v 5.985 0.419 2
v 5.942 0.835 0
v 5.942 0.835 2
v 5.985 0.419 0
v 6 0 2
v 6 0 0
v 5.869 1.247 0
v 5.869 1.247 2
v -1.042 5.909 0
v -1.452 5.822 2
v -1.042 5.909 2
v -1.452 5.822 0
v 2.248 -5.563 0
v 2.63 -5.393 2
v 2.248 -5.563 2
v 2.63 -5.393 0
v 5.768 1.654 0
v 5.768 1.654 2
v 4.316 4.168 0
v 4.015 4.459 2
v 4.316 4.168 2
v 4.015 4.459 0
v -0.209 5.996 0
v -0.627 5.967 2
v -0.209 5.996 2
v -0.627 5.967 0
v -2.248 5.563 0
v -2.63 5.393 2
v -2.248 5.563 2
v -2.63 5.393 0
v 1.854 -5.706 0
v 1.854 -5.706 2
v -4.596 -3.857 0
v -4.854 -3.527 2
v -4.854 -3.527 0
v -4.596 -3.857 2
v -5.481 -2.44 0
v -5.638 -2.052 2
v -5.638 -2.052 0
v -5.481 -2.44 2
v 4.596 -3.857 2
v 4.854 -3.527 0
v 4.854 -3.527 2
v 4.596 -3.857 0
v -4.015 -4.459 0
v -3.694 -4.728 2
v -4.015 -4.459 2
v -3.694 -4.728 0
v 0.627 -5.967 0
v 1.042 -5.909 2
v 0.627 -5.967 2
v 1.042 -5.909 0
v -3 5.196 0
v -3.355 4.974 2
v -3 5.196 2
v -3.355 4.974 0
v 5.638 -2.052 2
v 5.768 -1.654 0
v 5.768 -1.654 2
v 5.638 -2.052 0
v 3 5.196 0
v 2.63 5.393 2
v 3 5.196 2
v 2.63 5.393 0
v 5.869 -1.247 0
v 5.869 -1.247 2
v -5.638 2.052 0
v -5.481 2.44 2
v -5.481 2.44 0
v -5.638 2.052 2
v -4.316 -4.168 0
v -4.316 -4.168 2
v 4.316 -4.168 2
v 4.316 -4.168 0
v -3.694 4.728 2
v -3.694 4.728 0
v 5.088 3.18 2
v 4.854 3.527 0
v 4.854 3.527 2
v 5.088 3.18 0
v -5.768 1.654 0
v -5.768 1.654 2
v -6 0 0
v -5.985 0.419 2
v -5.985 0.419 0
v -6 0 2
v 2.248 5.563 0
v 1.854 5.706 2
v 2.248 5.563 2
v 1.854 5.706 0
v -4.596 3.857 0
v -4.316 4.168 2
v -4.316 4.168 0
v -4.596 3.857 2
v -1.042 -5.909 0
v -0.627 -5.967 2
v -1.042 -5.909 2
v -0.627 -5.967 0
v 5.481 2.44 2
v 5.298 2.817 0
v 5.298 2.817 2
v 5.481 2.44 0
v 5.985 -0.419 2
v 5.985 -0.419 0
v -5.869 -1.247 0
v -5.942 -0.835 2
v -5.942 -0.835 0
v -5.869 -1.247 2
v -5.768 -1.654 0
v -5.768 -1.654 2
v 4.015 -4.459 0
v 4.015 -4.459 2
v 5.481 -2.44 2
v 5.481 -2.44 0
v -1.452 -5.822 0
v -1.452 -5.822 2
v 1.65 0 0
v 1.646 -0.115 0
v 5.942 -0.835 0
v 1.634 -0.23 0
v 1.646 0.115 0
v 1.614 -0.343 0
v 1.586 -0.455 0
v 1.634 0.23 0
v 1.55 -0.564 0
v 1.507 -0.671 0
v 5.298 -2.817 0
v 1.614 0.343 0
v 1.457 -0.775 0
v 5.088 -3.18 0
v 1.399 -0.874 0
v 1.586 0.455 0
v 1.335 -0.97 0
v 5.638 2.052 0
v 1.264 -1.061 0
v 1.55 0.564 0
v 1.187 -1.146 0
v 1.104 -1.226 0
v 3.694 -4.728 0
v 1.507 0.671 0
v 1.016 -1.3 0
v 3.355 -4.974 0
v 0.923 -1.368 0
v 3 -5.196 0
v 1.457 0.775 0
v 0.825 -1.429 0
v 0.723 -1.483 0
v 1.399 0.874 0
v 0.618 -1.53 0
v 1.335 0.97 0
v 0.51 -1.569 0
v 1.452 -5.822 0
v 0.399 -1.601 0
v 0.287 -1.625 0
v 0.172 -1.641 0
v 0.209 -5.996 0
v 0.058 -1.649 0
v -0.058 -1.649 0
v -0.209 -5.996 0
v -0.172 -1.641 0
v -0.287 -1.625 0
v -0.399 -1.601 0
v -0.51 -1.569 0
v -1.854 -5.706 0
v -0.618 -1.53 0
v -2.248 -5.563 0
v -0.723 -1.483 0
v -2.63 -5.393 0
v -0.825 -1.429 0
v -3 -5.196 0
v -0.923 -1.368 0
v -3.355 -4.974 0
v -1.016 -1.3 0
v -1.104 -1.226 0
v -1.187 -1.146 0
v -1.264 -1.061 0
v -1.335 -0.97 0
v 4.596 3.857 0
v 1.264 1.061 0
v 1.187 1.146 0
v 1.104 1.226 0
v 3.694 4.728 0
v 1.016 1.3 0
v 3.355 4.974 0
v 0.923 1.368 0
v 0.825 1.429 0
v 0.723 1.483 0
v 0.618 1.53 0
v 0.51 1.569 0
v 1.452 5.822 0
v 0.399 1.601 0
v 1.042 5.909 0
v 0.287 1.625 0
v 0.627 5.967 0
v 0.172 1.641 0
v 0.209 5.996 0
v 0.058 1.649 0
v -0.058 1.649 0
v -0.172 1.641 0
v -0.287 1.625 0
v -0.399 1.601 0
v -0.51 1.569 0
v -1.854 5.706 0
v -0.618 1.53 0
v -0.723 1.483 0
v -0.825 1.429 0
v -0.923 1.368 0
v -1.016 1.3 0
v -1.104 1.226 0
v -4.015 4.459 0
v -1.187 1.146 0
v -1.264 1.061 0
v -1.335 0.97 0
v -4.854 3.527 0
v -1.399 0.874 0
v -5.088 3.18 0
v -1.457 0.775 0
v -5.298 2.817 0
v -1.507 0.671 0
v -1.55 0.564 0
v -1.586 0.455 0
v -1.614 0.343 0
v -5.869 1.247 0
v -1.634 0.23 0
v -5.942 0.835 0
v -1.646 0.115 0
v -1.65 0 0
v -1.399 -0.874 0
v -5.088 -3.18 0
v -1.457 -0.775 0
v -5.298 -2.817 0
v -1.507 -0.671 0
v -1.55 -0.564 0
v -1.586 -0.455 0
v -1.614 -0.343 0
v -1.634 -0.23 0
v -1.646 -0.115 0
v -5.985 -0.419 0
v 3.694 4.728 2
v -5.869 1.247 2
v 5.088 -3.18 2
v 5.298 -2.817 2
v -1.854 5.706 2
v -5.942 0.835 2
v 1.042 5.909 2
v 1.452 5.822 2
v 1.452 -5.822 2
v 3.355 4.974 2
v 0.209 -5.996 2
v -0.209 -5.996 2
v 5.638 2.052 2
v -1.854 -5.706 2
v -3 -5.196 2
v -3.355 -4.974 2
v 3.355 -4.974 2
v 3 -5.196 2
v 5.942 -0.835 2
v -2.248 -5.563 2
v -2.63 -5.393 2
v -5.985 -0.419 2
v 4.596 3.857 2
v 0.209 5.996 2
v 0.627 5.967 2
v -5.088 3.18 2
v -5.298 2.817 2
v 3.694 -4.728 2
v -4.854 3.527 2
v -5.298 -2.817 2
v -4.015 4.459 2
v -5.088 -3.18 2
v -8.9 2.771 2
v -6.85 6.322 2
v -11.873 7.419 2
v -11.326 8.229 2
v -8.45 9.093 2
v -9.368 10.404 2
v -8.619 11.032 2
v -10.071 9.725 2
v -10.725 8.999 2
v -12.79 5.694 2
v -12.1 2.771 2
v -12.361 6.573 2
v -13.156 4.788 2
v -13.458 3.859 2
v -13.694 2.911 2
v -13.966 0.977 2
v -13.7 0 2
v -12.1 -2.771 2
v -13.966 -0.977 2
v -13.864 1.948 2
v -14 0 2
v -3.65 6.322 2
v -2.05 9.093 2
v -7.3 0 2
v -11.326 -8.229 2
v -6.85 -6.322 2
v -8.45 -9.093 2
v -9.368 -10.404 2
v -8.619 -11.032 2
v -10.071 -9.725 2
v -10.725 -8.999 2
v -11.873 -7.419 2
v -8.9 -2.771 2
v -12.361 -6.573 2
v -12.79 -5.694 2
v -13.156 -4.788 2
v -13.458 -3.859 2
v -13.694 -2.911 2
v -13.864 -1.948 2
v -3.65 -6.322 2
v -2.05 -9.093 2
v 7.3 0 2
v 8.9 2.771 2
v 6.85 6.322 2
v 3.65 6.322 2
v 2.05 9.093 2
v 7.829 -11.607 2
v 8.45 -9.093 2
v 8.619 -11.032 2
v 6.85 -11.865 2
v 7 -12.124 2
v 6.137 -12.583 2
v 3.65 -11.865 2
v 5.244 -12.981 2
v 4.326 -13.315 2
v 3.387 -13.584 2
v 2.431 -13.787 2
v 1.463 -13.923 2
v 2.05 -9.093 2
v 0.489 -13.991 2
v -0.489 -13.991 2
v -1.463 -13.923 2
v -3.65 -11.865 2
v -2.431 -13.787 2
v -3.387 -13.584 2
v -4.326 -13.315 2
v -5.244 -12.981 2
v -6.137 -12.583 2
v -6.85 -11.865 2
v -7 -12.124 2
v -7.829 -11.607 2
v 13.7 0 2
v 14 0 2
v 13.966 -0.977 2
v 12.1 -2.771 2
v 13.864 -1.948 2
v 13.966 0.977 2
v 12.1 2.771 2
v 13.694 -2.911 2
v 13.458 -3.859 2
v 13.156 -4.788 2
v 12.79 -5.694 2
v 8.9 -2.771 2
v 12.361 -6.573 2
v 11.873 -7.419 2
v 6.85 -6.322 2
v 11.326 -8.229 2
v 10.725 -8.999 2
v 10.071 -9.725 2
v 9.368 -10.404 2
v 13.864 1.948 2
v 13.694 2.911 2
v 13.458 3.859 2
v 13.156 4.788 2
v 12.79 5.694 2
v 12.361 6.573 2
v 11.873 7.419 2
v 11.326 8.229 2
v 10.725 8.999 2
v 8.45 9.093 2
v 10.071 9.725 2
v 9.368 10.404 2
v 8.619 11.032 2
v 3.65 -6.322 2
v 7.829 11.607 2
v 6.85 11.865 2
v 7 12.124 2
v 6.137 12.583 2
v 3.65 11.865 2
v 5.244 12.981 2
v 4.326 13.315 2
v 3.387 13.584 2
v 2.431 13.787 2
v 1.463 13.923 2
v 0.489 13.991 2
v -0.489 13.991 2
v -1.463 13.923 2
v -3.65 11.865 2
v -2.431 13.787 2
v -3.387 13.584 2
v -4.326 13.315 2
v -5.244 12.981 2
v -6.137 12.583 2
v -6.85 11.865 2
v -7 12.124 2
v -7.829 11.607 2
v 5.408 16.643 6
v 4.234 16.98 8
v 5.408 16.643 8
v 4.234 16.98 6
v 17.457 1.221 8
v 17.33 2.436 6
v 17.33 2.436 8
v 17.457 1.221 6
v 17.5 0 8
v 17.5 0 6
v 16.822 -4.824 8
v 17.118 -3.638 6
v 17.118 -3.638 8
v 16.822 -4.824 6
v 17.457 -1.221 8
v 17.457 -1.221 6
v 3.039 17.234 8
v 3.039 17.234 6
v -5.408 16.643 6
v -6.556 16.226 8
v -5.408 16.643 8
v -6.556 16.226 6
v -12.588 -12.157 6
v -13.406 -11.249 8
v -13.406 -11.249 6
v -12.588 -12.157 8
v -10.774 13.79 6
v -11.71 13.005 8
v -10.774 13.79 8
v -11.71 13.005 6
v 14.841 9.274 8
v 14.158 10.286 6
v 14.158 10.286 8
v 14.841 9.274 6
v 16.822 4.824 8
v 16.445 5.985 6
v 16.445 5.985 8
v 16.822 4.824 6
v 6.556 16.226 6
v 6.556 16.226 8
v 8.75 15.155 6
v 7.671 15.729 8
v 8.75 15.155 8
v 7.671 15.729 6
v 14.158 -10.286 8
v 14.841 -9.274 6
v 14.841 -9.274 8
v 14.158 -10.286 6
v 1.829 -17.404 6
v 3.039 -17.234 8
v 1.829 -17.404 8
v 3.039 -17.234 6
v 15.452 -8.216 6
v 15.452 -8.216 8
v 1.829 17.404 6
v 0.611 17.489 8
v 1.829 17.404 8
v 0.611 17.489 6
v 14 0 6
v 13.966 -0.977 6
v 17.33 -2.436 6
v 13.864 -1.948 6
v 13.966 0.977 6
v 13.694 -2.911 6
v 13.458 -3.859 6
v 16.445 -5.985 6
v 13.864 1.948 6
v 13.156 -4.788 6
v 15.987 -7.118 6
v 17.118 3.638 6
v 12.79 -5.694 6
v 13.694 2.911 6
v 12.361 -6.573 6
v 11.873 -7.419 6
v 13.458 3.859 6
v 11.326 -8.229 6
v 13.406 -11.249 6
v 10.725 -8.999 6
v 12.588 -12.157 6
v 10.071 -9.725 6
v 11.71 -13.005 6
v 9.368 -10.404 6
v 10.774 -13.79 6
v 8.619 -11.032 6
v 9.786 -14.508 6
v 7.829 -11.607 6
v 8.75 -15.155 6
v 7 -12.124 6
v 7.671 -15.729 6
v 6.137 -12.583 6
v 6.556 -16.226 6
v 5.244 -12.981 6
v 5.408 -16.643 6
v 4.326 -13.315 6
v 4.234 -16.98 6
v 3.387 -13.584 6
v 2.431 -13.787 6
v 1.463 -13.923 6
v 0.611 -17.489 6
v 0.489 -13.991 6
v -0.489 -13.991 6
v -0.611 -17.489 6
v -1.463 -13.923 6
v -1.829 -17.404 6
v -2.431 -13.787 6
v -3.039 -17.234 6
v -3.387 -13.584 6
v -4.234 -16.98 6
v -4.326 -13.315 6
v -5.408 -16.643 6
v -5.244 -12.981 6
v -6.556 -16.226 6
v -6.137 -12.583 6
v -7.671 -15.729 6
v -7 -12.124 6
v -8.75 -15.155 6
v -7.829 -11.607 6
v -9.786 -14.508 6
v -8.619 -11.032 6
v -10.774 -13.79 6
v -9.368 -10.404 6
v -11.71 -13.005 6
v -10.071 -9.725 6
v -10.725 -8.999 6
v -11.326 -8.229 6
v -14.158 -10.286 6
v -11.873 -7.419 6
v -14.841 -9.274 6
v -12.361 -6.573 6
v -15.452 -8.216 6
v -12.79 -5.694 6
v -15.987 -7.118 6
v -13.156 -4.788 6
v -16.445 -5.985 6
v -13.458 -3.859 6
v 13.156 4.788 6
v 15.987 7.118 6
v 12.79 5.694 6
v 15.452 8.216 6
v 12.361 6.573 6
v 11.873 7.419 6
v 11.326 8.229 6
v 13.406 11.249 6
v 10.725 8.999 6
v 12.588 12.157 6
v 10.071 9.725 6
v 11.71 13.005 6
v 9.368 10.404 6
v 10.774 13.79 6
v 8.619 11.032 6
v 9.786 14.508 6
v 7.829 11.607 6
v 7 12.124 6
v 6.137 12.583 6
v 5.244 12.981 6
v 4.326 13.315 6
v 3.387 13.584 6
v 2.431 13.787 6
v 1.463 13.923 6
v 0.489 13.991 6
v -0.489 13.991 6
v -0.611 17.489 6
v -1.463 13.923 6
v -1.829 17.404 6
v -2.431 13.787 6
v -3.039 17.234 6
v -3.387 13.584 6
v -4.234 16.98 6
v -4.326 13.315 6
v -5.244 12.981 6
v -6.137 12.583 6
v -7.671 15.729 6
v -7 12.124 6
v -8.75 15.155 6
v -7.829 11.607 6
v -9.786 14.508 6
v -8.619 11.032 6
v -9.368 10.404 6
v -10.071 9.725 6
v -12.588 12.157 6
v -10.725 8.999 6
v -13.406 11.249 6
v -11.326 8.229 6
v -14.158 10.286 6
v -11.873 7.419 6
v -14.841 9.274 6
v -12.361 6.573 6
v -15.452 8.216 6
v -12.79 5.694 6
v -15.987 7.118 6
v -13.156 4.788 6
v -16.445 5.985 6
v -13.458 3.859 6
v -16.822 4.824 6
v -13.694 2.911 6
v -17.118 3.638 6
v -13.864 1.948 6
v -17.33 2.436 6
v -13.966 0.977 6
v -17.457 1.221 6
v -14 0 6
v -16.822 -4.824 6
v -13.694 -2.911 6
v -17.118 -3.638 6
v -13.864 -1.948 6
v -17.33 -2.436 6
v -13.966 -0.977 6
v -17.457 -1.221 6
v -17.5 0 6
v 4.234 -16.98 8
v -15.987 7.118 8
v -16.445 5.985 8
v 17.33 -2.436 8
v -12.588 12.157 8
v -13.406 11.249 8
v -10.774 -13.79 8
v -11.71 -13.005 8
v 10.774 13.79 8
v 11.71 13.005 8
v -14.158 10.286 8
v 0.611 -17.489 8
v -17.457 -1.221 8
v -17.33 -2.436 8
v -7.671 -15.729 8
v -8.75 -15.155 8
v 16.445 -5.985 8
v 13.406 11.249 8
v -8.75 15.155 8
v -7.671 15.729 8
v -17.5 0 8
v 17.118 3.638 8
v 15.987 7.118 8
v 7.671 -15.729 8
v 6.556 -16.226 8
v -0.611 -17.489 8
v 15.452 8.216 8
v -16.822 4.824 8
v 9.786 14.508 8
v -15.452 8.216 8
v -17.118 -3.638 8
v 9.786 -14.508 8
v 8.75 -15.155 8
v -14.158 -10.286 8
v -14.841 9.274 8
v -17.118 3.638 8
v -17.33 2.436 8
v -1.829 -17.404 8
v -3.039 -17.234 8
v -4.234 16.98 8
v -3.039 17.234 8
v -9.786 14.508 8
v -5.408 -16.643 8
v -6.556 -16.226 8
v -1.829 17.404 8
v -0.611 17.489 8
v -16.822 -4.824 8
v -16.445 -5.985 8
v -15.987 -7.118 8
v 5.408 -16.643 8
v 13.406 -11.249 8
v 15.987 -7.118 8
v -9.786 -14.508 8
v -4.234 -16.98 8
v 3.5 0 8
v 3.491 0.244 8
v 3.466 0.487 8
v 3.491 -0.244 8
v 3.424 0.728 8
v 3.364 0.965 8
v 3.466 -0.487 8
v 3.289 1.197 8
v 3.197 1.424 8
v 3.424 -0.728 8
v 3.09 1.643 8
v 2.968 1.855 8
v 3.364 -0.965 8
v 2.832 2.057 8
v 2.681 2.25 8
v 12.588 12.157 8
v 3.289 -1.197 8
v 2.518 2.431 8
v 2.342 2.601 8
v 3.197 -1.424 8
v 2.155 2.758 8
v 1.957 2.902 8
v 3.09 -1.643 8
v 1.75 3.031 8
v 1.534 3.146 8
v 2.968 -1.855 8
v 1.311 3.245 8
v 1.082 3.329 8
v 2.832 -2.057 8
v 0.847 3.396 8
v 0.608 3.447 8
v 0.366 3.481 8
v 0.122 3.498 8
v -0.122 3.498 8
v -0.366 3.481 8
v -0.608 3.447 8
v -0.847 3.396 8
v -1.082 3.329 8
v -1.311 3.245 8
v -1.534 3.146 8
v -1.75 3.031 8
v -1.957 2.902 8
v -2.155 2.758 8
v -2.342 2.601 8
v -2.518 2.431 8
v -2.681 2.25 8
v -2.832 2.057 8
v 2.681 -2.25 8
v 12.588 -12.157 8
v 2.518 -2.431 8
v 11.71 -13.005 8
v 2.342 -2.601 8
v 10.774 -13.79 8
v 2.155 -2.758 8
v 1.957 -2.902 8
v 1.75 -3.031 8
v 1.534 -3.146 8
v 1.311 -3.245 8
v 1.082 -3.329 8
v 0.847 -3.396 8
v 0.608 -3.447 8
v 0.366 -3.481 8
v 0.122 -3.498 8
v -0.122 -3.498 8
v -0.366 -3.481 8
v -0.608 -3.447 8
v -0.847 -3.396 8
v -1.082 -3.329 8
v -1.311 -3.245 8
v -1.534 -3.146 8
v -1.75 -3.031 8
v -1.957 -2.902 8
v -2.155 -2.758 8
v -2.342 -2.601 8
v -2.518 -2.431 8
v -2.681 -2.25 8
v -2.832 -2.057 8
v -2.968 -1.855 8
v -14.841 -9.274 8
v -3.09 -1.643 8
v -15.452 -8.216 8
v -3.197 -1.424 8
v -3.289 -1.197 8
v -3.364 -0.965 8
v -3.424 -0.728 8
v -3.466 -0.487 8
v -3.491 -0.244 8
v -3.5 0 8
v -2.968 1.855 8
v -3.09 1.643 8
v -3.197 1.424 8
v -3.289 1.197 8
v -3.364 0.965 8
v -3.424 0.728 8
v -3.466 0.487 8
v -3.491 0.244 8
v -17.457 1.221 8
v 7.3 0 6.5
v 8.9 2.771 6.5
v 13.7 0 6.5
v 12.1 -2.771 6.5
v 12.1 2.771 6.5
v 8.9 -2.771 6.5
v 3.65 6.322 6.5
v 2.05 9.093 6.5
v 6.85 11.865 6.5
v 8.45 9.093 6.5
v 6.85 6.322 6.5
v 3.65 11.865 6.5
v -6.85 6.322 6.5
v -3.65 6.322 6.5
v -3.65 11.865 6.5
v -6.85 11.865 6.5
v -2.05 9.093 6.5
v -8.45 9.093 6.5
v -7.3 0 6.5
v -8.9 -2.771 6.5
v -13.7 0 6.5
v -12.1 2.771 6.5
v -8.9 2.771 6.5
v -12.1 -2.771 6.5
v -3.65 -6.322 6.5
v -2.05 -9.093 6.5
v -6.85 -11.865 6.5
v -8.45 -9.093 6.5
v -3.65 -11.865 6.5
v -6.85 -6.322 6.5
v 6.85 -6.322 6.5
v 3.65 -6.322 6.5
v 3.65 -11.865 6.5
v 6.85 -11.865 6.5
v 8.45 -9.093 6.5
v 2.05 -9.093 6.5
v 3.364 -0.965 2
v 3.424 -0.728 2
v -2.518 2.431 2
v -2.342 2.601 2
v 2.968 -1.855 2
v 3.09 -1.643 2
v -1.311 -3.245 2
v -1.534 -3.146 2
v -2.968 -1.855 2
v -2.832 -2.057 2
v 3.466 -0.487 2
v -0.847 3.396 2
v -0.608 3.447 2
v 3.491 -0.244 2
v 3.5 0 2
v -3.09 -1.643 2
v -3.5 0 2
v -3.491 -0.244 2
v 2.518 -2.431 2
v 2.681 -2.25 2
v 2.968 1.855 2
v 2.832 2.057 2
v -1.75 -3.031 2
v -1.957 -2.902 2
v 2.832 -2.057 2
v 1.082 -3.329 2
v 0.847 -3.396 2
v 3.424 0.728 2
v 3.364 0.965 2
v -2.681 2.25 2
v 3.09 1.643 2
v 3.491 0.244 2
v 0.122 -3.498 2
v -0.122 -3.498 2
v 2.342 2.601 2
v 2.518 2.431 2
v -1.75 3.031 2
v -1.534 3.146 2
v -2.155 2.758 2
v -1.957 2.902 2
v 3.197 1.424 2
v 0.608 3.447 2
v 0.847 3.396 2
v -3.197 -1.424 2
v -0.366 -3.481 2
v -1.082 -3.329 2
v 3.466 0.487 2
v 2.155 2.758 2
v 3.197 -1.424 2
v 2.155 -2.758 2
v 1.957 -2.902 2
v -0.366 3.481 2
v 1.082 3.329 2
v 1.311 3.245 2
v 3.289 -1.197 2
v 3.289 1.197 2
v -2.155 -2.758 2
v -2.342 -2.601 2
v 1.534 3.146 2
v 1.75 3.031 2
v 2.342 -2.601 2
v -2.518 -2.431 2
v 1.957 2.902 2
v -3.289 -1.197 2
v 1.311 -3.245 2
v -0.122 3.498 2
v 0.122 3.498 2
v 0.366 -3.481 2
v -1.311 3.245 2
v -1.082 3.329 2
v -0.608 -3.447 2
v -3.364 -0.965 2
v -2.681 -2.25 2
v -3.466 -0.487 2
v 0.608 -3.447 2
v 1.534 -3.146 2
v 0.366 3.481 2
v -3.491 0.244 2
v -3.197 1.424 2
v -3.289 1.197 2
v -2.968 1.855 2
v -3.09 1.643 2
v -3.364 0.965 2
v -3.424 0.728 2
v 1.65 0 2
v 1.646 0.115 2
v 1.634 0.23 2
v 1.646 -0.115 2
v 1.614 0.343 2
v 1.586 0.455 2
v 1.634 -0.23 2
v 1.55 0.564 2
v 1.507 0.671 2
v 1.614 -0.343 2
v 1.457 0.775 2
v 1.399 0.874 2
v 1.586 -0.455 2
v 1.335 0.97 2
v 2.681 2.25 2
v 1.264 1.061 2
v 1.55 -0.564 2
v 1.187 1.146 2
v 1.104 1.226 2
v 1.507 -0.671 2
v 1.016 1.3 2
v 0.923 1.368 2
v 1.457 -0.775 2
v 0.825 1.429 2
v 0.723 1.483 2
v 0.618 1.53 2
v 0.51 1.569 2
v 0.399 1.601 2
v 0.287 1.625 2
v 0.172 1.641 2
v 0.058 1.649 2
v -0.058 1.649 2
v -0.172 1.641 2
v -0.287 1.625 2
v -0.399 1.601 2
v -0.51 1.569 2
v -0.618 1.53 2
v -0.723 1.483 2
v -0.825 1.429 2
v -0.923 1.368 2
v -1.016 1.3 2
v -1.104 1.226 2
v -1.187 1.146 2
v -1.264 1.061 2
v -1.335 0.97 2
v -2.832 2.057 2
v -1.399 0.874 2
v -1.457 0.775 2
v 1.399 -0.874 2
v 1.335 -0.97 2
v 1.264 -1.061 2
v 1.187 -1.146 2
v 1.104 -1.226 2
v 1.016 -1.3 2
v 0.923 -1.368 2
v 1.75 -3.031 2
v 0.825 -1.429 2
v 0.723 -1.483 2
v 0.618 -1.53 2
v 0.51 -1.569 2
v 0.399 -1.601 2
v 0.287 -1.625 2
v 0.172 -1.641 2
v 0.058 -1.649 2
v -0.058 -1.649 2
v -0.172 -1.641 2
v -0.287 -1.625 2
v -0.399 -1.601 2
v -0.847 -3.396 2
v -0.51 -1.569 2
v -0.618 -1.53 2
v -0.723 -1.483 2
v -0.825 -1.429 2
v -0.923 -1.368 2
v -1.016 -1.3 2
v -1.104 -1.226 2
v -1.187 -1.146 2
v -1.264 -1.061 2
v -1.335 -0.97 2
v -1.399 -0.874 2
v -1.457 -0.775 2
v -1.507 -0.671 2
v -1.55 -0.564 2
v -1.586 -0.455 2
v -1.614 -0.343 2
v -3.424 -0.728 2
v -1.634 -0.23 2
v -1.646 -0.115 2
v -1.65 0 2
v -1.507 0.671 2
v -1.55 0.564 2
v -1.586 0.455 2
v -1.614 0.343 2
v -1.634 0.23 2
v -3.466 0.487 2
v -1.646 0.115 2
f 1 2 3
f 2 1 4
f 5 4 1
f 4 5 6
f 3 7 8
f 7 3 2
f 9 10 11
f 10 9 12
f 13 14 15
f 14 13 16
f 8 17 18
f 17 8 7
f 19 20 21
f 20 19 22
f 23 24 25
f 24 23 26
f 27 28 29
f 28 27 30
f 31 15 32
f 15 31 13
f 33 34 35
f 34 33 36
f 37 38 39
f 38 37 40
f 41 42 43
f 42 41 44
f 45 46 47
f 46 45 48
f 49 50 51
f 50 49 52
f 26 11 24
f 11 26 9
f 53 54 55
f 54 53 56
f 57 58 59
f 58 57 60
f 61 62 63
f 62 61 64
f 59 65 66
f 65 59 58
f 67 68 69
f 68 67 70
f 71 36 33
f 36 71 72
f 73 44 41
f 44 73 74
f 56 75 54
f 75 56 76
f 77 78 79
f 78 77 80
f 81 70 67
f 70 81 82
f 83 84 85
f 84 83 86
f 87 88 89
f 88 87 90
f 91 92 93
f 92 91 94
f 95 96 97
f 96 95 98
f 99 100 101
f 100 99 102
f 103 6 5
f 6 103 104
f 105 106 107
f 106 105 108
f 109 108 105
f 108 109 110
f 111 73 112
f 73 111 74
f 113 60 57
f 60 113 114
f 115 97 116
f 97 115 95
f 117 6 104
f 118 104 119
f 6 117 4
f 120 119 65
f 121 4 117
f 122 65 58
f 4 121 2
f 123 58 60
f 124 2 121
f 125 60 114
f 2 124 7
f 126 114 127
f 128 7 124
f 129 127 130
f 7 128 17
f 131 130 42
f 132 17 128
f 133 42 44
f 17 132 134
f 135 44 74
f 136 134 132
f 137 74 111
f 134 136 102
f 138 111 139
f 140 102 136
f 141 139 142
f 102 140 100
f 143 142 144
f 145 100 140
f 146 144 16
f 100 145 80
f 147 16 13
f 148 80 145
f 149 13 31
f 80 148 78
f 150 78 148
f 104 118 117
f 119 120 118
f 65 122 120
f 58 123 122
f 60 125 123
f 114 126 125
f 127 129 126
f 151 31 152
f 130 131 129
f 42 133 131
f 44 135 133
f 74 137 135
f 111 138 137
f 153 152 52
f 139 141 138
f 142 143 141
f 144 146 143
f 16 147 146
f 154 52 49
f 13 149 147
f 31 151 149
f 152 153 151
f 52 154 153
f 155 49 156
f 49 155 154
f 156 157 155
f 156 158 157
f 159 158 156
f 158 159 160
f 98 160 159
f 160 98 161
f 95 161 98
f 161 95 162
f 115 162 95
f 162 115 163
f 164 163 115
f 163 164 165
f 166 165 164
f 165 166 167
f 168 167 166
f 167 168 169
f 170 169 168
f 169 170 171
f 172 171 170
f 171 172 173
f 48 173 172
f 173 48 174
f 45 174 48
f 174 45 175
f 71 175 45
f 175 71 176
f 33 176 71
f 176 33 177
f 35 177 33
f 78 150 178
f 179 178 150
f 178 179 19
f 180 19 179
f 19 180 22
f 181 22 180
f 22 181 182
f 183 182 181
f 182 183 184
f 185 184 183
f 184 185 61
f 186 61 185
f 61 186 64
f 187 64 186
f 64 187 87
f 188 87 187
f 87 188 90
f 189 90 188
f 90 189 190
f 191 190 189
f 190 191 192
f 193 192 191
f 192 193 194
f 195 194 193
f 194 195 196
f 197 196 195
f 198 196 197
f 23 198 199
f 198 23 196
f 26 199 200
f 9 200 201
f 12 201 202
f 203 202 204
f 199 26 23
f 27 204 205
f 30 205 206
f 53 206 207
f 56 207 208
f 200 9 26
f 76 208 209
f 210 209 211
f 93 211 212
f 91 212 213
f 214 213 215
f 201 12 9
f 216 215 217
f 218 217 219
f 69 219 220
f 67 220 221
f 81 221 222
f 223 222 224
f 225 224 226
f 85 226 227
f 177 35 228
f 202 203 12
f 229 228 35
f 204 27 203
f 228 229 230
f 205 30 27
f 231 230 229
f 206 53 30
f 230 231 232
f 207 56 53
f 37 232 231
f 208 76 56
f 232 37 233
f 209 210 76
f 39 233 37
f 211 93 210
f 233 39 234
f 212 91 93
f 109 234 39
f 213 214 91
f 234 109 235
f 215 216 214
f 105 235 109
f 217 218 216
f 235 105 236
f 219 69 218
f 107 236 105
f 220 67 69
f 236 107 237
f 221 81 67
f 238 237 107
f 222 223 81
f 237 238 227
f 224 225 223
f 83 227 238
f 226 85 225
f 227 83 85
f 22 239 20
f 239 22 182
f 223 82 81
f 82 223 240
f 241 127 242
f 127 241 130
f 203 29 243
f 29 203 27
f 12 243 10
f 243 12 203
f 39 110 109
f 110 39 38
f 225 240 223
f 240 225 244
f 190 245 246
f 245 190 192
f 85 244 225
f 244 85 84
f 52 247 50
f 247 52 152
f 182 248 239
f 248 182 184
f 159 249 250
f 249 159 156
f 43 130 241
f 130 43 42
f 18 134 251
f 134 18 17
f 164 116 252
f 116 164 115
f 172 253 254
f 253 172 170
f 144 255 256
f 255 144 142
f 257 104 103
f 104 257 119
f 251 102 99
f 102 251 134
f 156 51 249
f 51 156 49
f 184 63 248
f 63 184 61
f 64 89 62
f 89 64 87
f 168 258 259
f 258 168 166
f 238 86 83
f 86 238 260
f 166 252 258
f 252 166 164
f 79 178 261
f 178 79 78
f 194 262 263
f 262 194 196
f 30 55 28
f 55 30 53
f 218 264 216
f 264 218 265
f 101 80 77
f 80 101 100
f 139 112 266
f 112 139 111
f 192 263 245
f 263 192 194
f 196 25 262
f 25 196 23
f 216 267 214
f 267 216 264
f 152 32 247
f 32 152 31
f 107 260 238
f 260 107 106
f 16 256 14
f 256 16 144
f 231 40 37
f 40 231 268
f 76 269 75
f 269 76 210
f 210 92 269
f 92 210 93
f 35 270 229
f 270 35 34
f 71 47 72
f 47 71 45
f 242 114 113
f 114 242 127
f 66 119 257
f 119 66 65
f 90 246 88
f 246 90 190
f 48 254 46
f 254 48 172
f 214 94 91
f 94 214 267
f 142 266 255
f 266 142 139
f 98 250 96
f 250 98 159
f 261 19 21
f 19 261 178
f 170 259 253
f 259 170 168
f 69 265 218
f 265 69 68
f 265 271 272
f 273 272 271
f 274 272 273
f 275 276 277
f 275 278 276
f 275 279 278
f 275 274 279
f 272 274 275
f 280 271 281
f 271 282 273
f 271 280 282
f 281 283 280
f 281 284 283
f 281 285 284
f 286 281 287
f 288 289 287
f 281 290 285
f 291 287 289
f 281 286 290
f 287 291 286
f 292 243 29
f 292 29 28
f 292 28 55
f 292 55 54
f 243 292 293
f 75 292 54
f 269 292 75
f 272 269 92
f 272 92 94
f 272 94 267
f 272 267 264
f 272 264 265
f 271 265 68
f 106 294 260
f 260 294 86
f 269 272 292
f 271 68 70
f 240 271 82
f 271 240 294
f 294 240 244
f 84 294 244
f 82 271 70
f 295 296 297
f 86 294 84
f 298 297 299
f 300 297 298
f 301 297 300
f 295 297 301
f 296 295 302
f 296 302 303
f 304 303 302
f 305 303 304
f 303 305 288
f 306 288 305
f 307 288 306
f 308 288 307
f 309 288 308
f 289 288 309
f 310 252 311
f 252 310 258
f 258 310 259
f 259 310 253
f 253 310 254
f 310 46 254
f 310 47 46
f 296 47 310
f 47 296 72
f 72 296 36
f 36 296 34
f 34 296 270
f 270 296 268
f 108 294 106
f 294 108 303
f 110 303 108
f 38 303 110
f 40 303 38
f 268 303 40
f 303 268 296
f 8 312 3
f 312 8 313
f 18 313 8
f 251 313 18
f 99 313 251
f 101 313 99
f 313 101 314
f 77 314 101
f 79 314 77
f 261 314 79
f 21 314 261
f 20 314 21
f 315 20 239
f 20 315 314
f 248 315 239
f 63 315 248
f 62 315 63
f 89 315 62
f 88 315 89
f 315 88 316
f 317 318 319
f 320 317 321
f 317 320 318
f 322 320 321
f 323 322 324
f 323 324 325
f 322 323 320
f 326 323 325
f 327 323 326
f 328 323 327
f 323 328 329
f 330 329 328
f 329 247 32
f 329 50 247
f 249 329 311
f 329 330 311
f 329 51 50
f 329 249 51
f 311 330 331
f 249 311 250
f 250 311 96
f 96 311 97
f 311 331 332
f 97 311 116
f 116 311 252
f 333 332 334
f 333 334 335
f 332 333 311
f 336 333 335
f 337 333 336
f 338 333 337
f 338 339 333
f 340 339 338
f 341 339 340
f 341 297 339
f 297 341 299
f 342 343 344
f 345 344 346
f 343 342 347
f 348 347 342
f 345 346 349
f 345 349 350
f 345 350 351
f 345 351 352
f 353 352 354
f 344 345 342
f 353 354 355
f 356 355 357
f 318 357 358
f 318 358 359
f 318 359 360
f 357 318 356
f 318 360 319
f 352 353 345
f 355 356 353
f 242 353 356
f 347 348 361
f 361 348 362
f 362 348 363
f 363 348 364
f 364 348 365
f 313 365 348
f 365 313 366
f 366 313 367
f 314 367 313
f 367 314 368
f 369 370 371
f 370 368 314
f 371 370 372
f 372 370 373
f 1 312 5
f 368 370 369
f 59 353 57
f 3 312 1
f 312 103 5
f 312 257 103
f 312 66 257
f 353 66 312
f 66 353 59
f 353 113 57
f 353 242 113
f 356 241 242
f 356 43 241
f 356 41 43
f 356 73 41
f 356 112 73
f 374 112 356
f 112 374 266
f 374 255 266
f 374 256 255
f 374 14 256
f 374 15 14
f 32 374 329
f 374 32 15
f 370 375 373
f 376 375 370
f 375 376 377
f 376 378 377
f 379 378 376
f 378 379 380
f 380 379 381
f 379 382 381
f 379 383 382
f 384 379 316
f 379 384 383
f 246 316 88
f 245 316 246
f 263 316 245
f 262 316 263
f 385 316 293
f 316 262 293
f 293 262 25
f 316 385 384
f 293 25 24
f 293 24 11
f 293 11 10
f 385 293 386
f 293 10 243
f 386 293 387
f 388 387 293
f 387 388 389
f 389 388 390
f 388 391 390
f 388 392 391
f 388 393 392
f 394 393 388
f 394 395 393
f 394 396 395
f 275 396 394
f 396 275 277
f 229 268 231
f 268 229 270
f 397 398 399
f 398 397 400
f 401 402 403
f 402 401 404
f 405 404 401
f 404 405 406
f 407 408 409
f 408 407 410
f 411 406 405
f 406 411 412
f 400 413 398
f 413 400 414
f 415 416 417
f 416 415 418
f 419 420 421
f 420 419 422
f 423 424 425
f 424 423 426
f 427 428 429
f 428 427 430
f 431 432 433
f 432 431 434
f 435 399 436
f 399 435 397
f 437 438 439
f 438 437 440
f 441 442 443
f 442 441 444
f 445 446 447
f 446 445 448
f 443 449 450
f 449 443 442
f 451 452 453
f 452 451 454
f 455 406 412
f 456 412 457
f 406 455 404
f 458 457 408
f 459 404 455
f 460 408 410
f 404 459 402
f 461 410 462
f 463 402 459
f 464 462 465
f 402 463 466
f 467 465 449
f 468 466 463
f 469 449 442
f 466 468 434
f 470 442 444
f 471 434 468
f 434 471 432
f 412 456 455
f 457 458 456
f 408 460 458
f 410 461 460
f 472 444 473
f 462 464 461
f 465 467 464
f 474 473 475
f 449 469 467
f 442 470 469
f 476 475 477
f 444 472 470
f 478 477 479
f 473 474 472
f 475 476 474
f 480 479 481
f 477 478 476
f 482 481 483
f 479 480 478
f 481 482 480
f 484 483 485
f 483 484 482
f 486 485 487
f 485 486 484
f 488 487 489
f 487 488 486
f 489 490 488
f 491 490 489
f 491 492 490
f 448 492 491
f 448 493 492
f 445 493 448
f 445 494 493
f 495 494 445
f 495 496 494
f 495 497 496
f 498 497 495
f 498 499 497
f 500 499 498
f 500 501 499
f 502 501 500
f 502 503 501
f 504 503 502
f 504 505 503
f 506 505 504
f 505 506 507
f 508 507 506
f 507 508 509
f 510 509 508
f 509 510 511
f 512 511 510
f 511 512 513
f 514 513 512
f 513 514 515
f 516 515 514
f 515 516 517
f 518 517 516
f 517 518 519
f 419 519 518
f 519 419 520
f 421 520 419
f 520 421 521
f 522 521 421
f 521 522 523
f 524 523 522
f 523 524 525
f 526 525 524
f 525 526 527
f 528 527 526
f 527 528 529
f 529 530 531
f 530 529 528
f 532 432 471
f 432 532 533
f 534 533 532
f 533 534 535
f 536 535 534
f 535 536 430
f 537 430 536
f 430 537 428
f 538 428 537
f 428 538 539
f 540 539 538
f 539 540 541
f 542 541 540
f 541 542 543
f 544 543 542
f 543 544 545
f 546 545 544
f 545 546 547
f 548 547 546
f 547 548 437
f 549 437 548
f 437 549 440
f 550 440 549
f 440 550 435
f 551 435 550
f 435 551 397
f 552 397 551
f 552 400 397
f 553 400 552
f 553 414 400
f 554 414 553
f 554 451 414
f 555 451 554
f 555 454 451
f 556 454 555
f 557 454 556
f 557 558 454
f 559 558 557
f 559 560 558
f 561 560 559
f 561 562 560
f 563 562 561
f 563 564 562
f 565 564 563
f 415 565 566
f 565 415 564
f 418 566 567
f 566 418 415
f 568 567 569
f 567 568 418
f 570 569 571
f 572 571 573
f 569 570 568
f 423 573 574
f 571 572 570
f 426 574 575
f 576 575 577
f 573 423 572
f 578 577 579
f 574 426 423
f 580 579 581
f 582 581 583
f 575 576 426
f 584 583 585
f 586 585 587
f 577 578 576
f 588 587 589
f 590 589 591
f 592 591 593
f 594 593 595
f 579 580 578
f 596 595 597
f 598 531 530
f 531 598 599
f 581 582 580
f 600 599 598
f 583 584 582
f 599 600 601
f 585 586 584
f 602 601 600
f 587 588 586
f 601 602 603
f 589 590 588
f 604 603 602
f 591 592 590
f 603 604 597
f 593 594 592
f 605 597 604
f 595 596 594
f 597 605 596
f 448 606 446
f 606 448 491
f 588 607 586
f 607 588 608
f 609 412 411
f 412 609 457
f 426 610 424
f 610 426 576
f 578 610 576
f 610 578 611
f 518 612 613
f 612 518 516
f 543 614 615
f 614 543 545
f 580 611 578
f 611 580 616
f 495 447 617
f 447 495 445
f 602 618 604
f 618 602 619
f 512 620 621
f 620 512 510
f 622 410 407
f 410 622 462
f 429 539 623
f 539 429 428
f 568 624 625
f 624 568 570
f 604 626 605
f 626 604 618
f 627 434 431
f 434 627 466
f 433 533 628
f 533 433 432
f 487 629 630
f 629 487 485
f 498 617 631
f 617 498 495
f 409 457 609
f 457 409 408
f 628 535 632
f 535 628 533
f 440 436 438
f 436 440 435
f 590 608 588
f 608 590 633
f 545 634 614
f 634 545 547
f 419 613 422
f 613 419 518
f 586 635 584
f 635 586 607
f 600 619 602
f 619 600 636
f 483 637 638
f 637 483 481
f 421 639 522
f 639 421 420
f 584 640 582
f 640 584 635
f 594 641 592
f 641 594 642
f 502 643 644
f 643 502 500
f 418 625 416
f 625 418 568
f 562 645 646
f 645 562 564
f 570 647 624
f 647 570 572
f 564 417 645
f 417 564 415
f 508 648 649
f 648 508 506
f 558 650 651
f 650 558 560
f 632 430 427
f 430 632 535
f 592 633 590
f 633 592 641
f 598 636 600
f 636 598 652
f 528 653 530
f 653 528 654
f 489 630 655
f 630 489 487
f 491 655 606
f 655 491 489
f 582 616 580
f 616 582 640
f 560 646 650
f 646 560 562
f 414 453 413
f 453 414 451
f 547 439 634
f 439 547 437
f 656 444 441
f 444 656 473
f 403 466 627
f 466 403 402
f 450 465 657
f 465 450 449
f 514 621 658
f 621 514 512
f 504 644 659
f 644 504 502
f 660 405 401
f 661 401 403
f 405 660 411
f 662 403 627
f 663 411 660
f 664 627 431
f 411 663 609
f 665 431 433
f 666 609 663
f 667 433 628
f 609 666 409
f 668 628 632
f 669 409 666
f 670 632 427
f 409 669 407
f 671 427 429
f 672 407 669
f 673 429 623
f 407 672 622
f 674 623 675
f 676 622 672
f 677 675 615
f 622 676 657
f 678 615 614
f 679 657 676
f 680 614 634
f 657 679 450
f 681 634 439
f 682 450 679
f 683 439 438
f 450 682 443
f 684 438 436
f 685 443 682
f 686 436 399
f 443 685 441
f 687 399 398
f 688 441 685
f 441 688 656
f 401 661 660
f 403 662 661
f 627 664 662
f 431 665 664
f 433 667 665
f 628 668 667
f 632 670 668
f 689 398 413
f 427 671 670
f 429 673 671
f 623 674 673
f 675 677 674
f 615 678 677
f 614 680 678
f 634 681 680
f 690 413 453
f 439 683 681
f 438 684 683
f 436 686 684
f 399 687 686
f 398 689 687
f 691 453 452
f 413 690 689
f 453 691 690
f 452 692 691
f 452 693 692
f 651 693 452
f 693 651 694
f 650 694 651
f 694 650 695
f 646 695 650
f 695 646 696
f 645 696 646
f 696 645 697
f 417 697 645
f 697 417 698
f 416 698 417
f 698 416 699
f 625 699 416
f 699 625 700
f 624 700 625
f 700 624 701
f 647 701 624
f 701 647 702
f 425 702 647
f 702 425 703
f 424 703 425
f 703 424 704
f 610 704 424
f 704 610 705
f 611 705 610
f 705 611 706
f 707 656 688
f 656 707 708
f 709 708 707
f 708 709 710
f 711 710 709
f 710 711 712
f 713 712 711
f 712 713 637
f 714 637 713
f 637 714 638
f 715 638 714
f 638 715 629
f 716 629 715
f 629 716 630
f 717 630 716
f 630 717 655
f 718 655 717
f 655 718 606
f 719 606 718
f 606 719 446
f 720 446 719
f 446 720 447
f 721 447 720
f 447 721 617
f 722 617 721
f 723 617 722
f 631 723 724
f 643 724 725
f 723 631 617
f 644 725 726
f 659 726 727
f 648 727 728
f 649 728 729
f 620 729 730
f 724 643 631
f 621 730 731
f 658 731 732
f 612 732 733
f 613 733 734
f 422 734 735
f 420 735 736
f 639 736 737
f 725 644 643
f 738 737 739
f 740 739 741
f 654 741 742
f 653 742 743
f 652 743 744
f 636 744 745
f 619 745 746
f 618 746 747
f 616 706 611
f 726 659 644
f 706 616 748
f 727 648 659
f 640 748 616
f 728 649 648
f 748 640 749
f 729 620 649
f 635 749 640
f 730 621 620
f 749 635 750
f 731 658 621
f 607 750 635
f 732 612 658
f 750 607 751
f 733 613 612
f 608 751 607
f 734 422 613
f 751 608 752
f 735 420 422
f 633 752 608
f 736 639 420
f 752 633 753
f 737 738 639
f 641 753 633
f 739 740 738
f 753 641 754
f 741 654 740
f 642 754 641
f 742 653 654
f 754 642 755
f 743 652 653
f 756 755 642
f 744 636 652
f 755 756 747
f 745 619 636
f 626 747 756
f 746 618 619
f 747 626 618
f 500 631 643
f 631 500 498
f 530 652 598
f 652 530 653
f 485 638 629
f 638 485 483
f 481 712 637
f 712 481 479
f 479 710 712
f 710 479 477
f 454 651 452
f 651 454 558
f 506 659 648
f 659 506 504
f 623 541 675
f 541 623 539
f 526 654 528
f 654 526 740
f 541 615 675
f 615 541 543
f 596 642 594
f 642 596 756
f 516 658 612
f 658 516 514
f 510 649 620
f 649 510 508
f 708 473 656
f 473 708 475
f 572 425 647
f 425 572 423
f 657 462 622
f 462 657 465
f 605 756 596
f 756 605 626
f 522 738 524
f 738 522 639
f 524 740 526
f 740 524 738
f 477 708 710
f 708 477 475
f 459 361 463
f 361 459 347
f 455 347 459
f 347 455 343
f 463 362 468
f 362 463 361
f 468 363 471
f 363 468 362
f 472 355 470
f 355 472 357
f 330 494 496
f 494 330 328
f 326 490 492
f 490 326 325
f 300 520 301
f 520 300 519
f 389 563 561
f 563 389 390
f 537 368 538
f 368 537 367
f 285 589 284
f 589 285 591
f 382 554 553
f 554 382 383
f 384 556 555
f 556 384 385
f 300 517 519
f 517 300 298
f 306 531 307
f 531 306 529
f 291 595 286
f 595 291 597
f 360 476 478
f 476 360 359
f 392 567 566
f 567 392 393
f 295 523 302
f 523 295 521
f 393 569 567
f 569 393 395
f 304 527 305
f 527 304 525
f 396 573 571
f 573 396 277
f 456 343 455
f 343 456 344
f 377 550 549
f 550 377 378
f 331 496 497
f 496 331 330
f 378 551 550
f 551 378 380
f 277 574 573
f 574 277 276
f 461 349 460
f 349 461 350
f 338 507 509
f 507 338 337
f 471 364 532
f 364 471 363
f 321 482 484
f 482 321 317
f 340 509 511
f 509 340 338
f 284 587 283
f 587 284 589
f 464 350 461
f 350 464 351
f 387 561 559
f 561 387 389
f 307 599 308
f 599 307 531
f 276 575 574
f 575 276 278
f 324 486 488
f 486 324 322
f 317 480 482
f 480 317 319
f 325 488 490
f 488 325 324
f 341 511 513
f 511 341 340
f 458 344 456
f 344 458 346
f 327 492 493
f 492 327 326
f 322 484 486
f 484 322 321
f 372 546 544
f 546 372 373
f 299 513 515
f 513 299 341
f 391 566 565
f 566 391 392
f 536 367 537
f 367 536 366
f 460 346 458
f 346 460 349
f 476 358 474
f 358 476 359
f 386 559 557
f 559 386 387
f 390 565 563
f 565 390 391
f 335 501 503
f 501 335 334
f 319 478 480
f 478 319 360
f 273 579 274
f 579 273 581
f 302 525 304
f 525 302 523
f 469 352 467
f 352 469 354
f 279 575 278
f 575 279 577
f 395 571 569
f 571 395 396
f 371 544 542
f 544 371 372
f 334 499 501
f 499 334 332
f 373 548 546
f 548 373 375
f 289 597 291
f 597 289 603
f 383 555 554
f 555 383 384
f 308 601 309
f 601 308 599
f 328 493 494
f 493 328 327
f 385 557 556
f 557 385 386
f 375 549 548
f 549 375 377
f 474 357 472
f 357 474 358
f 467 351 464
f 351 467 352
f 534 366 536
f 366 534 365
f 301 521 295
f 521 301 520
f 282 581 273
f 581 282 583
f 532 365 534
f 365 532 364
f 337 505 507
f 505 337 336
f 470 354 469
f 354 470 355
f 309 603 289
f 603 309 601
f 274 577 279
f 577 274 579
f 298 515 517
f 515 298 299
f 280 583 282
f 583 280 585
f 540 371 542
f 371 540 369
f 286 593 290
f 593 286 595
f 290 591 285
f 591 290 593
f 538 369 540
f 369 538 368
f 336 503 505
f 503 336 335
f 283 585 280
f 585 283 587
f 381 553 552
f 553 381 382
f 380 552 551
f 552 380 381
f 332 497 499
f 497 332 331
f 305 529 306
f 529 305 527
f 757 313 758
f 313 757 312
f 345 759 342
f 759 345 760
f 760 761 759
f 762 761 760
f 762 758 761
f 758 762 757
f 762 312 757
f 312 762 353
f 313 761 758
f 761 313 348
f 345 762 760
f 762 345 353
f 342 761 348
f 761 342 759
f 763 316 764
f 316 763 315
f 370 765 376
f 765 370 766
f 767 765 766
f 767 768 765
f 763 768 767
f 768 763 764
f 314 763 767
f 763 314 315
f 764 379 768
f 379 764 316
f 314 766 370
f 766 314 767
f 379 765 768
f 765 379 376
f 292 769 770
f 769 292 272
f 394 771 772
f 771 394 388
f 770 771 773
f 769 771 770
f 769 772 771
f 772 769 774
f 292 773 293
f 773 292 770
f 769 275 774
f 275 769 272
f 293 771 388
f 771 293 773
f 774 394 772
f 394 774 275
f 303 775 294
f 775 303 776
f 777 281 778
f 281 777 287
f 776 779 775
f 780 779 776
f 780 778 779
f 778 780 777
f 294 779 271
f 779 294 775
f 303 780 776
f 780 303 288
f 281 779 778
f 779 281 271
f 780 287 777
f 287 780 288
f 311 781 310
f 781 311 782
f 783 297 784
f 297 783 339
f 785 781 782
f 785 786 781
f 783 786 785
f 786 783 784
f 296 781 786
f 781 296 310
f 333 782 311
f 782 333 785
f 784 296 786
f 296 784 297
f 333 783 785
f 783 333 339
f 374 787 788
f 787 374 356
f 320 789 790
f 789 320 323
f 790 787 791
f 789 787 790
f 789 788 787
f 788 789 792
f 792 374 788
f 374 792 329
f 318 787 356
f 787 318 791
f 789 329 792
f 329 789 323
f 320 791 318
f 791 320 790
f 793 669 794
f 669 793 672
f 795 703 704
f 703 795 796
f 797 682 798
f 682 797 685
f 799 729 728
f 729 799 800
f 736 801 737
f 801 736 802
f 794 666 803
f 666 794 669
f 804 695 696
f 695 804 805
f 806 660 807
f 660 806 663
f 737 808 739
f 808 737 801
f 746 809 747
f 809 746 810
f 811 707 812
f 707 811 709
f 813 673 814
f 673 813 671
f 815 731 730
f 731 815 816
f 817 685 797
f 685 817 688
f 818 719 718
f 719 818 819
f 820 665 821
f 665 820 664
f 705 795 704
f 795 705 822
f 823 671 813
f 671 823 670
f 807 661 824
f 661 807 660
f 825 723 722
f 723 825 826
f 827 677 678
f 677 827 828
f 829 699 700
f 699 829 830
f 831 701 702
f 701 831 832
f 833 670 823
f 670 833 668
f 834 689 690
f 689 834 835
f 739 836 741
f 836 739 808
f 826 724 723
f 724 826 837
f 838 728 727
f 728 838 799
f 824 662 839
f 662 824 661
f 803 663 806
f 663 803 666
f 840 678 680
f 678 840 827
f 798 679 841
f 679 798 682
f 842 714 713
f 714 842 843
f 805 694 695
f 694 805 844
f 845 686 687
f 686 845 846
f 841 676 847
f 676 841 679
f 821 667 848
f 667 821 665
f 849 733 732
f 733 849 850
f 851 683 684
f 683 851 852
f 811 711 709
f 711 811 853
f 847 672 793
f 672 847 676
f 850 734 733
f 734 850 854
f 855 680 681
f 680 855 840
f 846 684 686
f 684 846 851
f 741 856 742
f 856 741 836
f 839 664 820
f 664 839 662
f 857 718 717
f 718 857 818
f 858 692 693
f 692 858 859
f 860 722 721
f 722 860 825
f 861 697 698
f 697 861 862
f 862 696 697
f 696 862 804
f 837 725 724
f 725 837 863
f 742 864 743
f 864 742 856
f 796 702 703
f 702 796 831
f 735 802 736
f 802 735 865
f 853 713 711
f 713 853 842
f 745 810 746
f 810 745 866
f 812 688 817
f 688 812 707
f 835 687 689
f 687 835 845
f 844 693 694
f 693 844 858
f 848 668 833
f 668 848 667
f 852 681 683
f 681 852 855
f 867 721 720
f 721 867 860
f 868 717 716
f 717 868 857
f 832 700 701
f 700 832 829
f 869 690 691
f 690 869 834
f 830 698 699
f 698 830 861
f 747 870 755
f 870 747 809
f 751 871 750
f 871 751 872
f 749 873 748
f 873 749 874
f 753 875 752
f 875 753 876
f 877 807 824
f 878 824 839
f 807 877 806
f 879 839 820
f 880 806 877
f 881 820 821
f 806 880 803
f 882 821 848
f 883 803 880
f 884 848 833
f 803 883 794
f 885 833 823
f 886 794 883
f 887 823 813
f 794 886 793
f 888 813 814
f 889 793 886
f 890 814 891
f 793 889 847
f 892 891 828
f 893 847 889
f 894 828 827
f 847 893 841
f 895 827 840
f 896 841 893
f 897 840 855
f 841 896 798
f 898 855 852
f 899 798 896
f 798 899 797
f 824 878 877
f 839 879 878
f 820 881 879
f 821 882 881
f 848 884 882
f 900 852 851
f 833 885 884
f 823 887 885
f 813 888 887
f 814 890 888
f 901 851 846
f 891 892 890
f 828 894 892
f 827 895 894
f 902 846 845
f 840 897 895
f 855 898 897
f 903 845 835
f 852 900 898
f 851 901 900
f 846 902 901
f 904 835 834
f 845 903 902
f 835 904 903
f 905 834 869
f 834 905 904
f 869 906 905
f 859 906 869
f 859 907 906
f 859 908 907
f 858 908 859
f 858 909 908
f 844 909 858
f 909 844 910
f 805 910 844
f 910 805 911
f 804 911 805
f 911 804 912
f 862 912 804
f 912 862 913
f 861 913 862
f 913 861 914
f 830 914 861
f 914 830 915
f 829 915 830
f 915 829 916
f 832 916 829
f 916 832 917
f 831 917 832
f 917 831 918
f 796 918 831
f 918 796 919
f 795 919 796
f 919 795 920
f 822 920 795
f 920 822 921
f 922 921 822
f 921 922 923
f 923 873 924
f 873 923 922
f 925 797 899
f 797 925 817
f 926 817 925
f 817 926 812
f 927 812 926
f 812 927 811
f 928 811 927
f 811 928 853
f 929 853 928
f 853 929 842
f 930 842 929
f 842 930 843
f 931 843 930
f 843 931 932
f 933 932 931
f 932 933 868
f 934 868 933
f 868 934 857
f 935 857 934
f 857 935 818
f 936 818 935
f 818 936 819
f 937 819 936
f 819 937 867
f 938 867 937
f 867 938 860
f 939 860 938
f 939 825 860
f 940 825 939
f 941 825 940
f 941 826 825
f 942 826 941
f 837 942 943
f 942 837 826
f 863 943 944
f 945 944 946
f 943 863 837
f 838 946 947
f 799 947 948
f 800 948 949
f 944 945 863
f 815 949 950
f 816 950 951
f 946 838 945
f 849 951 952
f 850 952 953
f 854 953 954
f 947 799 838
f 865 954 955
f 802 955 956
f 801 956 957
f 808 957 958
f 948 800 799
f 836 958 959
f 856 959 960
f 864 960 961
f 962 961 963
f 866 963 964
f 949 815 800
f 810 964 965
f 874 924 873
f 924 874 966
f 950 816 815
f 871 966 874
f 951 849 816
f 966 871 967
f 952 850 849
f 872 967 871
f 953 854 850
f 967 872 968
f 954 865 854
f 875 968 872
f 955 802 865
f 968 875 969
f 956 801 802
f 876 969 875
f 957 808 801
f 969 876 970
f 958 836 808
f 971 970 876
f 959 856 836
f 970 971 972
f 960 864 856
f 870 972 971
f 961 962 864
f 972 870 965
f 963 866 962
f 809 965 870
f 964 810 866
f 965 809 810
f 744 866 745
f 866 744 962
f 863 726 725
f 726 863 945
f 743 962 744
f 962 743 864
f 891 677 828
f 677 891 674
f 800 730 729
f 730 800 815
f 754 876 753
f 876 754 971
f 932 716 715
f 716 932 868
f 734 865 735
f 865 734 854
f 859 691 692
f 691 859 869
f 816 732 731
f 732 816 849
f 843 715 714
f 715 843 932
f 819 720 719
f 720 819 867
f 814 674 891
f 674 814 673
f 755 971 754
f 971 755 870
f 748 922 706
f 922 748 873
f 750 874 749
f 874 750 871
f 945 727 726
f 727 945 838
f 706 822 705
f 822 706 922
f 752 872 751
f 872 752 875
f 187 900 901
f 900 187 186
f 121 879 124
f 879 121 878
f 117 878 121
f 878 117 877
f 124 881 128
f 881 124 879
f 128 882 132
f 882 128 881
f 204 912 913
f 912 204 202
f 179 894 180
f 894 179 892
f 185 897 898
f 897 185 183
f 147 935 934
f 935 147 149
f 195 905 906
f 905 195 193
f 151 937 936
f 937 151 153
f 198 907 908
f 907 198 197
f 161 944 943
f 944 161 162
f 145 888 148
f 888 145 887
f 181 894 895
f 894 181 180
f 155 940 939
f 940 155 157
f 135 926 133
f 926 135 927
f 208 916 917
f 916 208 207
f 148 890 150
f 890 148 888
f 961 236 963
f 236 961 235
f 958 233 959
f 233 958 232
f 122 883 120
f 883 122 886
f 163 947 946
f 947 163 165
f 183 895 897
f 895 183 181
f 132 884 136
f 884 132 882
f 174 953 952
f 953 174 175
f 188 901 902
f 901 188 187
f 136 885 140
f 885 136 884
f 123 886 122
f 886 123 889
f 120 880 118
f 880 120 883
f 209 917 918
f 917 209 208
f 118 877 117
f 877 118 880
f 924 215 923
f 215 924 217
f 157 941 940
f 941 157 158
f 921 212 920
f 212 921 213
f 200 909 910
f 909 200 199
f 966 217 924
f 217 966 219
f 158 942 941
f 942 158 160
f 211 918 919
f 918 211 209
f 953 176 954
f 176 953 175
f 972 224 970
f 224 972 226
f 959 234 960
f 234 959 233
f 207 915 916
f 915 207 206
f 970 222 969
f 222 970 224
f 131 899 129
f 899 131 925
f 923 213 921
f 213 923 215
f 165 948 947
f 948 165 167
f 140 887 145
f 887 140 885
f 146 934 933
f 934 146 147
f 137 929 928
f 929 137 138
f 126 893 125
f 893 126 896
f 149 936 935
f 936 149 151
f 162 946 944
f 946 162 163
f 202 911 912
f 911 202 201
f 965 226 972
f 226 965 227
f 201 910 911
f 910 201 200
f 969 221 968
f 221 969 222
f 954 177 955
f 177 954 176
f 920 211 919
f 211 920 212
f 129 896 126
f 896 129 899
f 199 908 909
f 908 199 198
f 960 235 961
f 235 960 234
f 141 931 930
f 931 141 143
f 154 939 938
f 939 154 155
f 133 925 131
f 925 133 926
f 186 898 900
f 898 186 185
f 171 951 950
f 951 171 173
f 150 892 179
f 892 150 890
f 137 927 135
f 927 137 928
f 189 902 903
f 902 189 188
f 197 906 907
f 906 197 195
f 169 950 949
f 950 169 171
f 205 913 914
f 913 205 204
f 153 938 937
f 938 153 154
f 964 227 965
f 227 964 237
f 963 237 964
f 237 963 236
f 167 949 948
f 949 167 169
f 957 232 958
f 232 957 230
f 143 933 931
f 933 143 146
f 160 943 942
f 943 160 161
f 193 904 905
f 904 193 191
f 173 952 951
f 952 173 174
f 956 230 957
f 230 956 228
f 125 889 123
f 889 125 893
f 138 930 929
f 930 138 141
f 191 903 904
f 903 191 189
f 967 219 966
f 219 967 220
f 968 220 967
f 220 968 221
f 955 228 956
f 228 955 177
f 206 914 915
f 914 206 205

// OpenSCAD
// file: screws.scad
// https://www.engineersedge.com/hardware/standard_metric_hex_nuts_13728.htm
// m2: d=4    D=4.62
// m3: d=5.5  D=6.35
module hex(D,t){
    x = D/2;
    y = sqrt(3)/2*x;
    pts = [
        [x/2,y],
        [x,0],
        [x/2,-y],
        [-x/2,-y],
        [-x,0],
        [-x/2,y]
    ];
    linear_extrude(height=t){
        polygon(pts);
    }
}

module M3Nut(t){
    hex(6.4, t);
    cylinder(h=2*t, d=3.3, center=true);
}

module M2(h){
    cylinder(h, d=2.2);
}

module M3(h){
    cylinder(h=h, d=3.3);
}
// main file
// MIT Kevin Walchko 2019

$fn = 90;

// library folder
use <screws.scad>;

module servo(){
    import("lib/lx16a.stl");
}

module wheelhub(){
    difference()
    {
        thick = 10;
        s = sqrt(2*12*12/2/2);
        echo(">> square size:",s);
        cylinder(d=28, h=thick);
        translate([-s/2,-s/2,-4]) cube([s,s,thick+8]);
        for (x = [0:60:360]) rotate([0,0,x]) translate([21/2,0,-2]) M3(thick+4);
        M3(thick+10);
    }
}

module servohub(){
    // LX-16A
    thick = 2;
    s = 8.3;
    h = 21;
    difference()
    {
        union(){
            cylinder(d=25, h=thick);  // servo face plate
            translate([0,0,thick]) cylinder(d=14, h=8);  // offset
            translate([-s/2,-s/2,thick]) cube([s,s,h]);
        }
        // 17 mm holes
        translate([17/2,0,-2]) M2(thick+4);
        translate([17/2,0,2]) cylinder(d=4.5, h=12);
        rotate([0,0,180]) {
            translate([17/2,0,-2]) M2(thick+4);
            translate([17/2,0,2]) cylinder(d=4.5, h=12);
        }

        // 14 mm holes
        rotate([0,0,90]) {
            translate([14/2,0,-2]) M2(thick+4);
            translate([14/2,0,2]) cylinder(d=4.5, h=12);
        }
        rotate([0,0,270]) {
            translate([14/2,0,-2]) M2(thick+4);
            translate([14/2,0,2]) cylinder(d=4.5, h=12);
        }

        cylinder(d=2.5,h=h+5);  // self-tapping screw
        translate([0,0,-1]) cylinder(d=8.5,h=2.5); // bolt and bump out
    }
}

module servohub2(){
    // AX-12A
    thick = 2;
    s = 8.3;
    /* h = 21; */
    wheelcube = 13; // length from wheel face to face
    hub = 7;  // offset from servo face to wheel face, 8
    h = wheelcube + hub;
    difference()
    {
        union(){
            cylinder(d=25, h=thick);  // servo face plate
            translate([0,0,thick]) cylinder(d=14, h=hub);  // offset
            translate([-s/2,-s/2,thick]) cube([s,s,h]);
        }
        // 16 mm holes
        ring = 16;
        /* translate([ring/2,0,-2]) M2(thick+4);
        translate([ring/2,0,2]) cylinder(d=4.5, h=12); */
            for (x = [0:90:270]){
            rotate([0,0,x]) {
                translate([ring/2,0,-1]) M2(thick+4);
                translate([ring/2,0,thick]) cylinder(d=4.5, h=12);
            }
        }

        /* // 14 mm holes
        rotate([0,0,90]) {
            translate([14/2,0,-2]) M2(thick+4);
            translate([14/2,0,2]) cylinder(d=4.5, h=12);
        }
        rotate([0,0,270]) {
            translate([14/2,0,-2]) M2(thick+4);
            translate([14/2,0,2]) cylinder(d=4.5, h=12);
        } */

        translate([0,0,hub-1]) cylinder(d=2.5,h=h+5);  // self-tapping screw
        /* translate([0,0,-1]) cylinder(d=8.5,h=2.5); // bolt and bump out */
    }
}


module wheeldisk(){
    translate([0,0,0]){
        difference()
        {
            translate([0,0,-5/2]) cylinder(d=60, h=5);
            translate([0,0,-10]) cylinder(d=12, h=20);
            for (x = [0:60:360]) rotate([0,0,x]) translate([21/2,0,-10]) M3(20);
        }
        for (x = [0:72:360]) rotate([0,0,x]) translate([48/2,0,0]) rotate([90,0,0]) cylinder(d=13, h=18.5, center=true);
    }
}

module wheel(){
    translate([0,0,0]) wheeldisk();
    translate([0,0,5/2]) wheelhub();
    translate([0,0,10+5/2]) rotate([0,0,180]) wheeldisk();
}

module hubcap(){
    difference()
    {
        stem = 2;
        offset = 6;
        union() {
            cylinder(d=12, h=stem);
            translate([0,0,stem+offset-2]) cylinder(d=35, h=2); // outer cap
            translate([0,0,stem]) cylinder(d=28, h=6); // house bolts
        }
        translate([0,0,2]) cylinder(d=7, h=15); // socket head hole down
        translate([0,0,-2]) M3(5);  // self-tapping screw hole
        for (x = [0:60:360]) rotate([0,0,x]) translate([21/2,0,stem-0.5]) M3Nut(5);
    }
}

module wheelgroup(s=true, w=true, h=true, c=true){
    if (h) servohub();
    if (s) translate([0,12,-19]) servo();
    if (w) translate([0,0,2+10+5/2-2-2]) wheel();  // I don't model the inner ring correctly .. so 2 mm down more
    if (c) translate([0,0,2+10+5/2+13-4]) hubcap();
}

/* wheelgroup(w=false, h=false); */

/* wheeldisk(); */

/* servohub2(); */
hubcap();
